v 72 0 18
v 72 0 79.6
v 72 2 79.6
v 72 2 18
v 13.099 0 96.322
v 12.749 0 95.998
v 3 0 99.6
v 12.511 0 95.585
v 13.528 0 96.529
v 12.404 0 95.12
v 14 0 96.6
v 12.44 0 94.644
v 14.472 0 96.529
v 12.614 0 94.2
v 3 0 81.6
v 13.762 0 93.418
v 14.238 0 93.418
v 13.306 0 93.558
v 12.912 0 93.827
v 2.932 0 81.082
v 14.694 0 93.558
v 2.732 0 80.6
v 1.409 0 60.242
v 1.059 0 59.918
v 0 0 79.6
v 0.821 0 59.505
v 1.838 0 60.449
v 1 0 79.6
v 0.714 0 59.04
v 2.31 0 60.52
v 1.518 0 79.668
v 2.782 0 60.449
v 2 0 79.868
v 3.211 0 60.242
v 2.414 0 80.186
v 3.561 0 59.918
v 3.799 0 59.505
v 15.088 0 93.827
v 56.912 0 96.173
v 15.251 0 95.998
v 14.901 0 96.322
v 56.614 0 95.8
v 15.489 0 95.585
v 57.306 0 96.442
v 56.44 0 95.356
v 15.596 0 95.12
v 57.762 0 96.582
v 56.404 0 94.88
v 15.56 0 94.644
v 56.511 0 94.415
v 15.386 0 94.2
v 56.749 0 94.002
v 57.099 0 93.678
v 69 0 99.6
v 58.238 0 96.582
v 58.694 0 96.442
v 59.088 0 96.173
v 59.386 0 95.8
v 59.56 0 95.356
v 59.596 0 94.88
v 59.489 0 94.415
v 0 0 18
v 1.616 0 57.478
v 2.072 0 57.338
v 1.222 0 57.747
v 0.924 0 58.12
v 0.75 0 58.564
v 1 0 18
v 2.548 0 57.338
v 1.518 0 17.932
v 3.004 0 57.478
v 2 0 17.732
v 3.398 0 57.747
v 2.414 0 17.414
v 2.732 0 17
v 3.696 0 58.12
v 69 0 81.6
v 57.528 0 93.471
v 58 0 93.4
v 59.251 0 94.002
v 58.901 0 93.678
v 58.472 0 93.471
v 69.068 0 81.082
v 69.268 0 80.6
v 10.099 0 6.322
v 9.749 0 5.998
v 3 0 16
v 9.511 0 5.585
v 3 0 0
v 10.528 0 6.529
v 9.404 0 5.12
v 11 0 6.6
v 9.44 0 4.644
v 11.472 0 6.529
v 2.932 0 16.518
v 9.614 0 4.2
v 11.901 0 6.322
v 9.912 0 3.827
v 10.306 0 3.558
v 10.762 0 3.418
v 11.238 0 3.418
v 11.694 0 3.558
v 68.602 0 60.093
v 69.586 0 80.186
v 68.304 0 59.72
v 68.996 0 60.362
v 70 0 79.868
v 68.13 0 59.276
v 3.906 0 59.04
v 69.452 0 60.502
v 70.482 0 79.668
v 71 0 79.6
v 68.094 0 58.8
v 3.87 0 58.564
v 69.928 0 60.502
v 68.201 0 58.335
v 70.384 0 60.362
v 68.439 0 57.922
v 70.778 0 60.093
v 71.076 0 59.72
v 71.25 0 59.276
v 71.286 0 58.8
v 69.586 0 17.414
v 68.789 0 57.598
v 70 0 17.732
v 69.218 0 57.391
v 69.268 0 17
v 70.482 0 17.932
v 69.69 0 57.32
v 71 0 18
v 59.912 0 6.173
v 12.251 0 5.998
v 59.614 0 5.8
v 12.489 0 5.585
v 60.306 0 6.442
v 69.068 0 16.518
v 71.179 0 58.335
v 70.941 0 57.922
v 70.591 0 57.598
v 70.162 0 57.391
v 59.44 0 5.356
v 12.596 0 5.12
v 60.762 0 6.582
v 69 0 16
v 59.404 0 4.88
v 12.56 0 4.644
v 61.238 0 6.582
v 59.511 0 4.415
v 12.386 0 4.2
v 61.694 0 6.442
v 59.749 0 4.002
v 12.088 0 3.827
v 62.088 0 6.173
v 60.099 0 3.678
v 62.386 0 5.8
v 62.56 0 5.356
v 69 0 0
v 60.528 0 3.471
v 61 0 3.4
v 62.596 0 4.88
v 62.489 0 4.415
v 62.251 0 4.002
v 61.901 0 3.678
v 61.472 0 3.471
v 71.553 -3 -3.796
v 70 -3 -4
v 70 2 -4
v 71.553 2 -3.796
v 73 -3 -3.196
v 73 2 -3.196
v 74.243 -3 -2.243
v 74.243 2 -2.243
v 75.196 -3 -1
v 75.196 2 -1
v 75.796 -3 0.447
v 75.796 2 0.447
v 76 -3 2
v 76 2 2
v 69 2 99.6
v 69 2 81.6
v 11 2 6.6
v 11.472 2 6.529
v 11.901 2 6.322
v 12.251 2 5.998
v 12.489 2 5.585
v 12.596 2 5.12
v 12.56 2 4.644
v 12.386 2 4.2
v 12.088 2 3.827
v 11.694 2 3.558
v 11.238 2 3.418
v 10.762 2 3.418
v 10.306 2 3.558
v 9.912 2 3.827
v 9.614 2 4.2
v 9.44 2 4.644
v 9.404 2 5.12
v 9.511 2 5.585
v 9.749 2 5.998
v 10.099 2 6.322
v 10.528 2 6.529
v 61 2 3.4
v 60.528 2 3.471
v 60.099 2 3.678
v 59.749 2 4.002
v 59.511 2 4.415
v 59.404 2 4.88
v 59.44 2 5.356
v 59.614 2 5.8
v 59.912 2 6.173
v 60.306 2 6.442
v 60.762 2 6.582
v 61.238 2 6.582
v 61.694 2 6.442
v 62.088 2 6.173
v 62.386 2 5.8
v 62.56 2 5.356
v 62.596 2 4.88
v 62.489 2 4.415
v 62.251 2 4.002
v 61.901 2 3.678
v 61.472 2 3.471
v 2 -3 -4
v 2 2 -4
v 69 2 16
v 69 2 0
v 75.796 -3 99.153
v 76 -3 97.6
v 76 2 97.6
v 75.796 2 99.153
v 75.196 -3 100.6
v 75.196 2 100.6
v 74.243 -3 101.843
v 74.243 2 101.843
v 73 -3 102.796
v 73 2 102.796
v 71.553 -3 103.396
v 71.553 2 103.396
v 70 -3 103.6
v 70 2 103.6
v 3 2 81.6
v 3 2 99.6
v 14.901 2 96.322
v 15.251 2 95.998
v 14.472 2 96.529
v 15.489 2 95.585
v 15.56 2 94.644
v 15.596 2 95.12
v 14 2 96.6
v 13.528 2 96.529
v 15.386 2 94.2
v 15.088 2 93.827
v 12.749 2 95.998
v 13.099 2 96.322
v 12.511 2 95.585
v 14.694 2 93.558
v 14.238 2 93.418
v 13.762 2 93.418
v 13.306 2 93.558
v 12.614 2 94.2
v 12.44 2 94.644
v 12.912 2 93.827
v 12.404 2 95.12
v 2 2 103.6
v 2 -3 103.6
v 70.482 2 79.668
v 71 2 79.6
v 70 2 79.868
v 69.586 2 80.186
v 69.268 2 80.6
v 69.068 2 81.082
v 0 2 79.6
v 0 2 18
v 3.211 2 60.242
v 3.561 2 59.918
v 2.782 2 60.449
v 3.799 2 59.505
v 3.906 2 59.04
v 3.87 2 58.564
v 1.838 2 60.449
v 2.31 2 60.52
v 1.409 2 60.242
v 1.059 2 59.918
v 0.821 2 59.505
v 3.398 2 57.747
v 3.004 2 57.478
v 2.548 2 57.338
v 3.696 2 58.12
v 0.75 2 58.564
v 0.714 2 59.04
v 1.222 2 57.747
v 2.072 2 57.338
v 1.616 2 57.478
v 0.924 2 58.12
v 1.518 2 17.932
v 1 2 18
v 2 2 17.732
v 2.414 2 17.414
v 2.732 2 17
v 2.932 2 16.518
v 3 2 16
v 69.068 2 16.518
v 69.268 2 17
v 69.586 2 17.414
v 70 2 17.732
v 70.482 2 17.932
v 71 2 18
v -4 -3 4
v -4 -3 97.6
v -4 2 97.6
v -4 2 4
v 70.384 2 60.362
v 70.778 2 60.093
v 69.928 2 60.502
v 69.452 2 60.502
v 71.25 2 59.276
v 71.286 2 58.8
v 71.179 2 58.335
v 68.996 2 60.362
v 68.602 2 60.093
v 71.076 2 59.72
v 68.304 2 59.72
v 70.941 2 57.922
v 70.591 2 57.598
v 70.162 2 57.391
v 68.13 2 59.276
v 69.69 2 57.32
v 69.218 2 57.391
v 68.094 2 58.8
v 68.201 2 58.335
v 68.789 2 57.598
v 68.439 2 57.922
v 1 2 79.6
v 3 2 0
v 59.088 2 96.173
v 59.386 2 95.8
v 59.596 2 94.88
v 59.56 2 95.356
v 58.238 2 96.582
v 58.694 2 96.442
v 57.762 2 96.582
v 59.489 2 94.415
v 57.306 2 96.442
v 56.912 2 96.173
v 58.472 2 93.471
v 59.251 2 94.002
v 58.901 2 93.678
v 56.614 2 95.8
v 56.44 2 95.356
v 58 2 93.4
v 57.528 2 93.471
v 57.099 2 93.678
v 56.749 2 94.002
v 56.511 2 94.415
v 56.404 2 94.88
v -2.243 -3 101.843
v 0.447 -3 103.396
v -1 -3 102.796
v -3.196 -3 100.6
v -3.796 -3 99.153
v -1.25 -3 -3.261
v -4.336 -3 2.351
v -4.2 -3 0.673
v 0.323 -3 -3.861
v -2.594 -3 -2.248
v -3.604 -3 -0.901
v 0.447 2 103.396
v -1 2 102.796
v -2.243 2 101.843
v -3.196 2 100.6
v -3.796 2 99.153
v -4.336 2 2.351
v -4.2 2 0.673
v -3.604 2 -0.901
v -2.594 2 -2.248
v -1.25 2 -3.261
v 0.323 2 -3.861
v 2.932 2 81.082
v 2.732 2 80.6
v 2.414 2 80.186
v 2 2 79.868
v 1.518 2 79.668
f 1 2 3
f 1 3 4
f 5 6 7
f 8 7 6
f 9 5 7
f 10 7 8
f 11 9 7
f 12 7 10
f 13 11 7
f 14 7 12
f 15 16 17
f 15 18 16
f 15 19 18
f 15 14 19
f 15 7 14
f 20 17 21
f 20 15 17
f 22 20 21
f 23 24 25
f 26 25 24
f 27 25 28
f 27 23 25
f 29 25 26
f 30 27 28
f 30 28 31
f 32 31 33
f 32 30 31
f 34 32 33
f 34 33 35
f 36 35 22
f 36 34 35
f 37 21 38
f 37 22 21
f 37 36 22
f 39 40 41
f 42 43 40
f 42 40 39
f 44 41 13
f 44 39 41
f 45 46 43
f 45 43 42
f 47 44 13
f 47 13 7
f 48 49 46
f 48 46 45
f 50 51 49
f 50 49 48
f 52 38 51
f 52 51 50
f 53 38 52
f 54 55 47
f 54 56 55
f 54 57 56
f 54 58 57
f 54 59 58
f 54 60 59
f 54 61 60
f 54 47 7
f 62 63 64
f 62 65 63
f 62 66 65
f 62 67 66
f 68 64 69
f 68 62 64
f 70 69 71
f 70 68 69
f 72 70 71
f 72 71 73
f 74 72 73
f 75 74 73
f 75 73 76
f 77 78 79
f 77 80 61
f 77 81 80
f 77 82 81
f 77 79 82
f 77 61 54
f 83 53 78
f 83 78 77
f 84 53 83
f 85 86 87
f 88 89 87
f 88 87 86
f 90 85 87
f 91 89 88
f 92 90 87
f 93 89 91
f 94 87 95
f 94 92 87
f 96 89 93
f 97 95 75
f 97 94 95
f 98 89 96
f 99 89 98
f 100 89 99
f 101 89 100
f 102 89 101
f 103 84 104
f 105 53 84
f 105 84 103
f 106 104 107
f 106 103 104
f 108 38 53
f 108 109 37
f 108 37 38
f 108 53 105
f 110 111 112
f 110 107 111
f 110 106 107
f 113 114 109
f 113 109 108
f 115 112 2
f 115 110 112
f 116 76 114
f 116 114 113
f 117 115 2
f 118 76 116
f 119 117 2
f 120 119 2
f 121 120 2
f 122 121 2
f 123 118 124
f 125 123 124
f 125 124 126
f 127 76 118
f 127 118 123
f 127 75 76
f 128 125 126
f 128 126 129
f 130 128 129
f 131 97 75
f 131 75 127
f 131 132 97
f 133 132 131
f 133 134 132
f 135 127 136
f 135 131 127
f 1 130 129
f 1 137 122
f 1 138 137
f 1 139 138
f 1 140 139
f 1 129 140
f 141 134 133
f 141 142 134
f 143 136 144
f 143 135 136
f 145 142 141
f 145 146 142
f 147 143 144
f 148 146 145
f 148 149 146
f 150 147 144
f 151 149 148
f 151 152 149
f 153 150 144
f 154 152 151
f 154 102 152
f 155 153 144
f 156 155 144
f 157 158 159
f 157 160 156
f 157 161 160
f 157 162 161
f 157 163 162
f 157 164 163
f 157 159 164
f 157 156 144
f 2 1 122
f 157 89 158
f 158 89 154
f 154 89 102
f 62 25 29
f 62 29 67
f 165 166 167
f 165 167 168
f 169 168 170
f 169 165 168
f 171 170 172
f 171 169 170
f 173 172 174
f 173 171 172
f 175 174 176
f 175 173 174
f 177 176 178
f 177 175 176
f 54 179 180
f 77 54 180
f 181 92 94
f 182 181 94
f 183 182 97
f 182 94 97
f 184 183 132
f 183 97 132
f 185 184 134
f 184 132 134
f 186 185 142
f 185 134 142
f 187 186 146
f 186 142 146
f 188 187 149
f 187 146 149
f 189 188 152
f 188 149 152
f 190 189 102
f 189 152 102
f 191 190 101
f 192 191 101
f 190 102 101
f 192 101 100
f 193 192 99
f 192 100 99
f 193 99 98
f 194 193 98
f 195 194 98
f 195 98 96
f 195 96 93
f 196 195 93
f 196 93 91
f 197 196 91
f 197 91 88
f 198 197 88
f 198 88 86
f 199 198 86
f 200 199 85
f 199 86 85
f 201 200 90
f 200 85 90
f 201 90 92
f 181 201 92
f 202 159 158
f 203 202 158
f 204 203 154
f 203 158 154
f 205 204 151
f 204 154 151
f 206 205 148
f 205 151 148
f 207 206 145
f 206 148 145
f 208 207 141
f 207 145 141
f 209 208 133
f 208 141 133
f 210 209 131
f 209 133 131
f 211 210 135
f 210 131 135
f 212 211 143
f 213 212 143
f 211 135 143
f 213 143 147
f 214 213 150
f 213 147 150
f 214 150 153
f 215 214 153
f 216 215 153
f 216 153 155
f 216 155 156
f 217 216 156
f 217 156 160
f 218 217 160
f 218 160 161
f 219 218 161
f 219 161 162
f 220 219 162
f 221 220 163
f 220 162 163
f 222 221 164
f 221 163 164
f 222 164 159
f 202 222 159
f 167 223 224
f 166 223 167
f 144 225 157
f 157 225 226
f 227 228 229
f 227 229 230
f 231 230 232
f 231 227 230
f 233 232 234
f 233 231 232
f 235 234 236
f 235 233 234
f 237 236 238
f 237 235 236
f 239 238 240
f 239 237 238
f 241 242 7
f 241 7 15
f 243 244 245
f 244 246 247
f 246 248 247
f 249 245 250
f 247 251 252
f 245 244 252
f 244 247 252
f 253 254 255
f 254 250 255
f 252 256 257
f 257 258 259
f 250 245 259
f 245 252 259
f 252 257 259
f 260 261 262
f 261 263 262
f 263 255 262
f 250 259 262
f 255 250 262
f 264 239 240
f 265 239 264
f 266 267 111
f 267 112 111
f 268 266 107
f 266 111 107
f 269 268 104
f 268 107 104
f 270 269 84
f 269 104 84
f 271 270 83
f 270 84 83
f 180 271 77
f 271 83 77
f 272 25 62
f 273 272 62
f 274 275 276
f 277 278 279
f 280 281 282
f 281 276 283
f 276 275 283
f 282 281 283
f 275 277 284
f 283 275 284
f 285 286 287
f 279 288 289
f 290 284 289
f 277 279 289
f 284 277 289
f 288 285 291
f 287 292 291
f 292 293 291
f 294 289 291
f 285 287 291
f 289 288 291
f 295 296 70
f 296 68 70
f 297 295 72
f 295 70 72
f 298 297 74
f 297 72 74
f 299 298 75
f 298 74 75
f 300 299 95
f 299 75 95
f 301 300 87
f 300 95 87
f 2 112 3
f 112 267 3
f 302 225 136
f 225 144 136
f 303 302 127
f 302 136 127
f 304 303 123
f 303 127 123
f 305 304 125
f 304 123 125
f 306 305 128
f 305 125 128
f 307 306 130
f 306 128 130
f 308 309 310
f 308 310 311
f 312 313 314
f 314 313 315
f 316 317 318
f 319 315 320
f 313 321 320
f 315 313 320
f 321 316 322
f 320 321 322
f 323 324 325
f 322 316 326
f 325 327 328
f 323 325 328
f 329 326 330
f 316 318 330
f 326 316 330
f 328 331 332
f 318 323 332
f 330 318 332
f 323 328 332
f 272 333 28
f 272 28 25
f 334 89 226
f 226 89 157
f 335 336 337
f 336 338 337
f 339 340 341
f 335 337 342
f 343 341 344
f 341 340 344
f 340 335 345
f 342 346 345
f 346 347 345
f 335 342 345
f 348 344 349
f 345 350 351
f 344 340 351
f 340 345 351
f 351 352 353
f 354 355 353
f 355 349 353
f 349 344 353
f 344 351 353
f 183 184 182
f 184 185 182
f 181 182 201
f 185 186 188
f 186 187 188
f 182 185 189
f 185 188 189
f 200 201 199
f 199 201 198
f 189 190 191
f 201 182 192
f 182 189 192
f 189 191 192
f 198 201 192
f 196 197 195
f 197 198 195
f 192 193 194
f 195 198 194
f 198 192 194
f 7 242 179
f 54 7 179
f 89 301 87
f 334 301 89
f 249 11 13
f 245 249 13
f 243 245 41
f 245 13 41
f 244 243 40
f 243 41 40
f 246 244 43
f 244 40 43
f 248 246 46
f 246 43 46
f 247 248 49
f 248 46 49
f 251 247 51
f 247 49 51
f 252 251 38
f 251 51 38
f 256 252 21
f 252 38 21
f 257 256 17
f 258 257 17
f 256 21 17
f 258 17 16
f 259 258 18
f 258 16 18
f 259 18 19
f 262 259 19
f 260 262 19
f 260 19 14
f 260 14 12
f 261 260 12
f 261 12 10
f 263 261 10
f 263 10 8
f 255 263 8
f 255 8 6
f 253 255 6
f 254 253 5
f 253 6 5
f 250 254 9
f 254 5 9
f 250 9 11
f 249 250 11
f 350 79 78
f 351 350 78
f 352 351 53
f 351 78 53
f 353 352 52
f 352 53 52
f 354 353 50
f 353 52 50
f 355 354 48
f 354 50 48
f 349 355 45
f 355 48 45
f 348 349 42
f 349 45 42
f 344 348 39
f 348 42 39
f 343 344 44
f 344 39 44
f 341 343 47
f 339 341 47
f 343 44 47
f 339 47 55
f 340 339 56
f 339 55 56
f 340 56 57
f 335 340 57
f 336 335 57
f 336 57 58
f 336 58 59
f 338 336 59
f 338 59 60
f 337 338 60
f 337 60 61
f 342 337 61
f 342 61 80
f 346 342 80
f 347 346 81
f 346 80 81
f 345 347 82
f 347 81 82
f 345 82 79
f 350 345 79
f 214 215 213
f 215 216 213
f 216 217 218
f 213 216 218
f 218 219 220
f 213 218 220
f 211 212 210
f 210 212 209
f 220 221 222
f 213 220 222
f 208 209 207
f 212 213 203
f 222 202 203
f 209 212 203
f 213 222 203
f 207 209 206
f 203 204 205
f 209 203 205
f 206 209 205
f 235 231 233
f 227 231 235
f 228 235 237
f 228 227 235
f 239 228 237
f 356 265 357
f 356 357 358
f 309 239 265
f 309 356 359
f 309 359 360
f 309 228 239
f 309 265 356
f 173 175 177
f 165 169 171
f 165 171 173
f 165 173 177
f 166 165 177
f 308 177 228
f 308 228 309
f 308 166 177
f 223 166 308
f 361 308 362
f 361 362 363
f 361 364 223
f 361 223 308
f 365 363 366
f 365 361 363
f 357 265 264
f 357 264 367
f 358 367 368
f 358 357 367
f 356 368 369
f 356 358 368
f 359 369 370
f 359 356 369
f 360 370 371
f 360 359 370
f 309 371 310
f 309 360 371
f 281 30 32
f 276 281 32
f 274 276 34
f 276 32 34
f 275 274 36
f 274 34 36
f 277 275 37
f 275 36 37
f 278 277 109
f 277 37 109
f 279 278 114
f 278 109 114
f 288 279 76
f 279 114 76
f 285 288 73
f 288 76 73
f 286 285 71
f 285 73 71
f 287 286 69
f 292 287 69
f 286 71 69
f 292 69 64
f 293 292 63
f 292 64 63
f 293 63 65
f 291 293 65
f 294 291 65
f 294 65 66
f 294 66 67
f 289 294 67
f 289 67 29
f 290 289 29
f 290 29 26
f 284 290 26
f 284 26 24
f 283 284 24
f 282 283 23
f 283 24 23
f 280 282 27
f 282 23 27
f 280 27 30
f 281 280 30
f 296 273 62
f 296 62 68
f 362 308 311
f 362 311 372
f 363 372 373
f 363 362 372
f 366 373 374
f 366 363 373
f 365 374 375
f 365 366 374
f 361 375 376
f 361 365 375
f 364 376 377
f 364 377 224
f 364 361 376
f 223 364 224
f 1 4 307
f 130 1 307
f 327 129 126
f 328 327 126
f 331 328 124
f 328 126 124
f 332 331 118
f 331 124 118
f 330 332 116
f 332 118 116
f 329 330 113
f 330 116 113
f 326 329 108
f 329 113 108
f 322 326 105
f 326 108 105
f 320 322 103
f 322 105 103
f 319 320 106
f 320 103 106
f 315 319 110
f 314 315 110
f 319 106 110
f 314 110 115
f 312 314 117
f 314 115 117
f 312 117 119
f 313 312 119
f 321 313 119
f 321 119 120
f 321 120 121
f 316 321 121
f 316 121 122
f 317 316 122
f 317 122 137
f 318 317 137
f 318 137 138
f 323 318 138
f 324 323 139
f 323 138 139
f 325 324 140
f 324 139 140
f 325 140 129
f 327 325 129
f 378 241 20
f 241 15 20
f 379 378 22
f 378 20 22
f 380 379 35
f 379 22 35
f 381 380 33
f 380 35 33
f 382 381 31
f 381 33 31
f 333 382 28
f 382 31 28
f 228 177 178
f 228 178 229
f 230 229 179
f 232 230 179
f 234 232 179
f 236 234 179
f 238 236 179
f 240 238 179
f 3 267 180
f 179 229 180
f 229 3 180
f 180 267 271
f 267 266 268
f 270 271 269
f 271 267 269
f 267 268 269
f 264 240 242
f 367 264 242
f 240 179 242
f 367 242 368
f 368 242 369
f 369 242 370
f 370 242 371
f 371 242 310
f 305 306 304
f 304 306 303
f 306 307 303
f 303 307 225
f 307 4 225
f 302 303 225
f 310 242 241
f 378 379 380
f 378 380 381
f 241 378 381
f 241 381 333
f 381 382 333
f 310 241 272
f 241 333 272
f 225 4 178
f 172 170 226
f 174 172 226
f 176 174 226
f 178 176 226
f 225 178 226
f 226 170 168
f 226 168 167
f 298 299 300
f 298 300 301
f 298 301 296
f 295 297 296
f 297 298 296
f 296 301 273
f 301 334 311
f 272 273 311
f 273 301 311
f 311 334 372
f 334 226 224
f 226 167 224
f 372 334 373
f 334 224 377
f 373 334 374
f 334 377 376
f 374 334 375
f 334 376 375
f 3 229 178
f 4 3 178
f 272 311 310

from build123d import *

# Parameters (mm, degrees)
SKETCH_1_W          = 72
SKETCH_1_H          = 99.6
SKETCH_1_R          = 1.6
EXTRUDE_1_DEPTH     = 2
FILLET_1_R          = 3
SKETCH_7_W          = 2.173613934
SKETCH_7_H          = 4.368539476
CUT_EXTRUDE_1_DEPTH = 10
CUT_EXTRUDE_2_DEPTH = 10
FILLET_2_R          = 2
SKETCH_9_W          = 2.173613934
SKETCH_9_H          = 2.184269738
EXTRUDE_5_DEPTH     = 2
FILLET_4_R          = 2
FILLET_5_R          = 2
EXTRUDE_4_DEPTH     = 5


with BuildPart() as part:
    # 草图1 → 凸台-拉伸1 (new body)
    with BuildSketch(Plane(origin=(0, 0, 0), x_dir=(1, 0, 0), z_dir=(0, 1, 0))):
        with Locations((36, -49.8)):
            Rectangle(SKETCH_1_W, SKETCH_1_H)
        with Locations((11, -5)):
            Circle(SKETCH_1_R, mode=Mode.SUBTRACT)
        with Locations((14, -95)):
            Circle(SKETCH_1_R, mode=Mode.SUBTRACT)
        with Locations((58, -95)):
            Circle(SKETCH_1_R, mode=Mode.SUBTRACT)
        with Locations((61, -5)):
            Circle(SKETCH_1_R, mode=Mode.SUBTRACT)
        with Locations((2.31, -58.92)):
            Circle(SKETCH_1_R, mode=Mode.SUBTRACT)
        with Locations((69.69, -58.92)):
            Circle(SKETCH_1_R, mode=Mode.SUBTRACT)
    extrude(amount=EXTRUDE_1_DEPTH)

    # 圆角1
    fillet_1_edges = [part.edges().sort_by_distance(p)[0] for p in [
        (0, 1, 0),
        (72, 1, 0),
        (72, 1, 99.6),
        (0, 1, 99.6),
    ]]
    fillet(fillet_1_edges, radius=FILLET_1_R)

    # 草图7 → 切除-拉伸1 (cut)
    with BuildSketch(Plane(origin=(0, 2, 0), x_dir=(1, 0, 0), z_dir=(0, 1, 0))):
        with Locations((36, -99.6)):
            Rectangle(SKETCH_7_W, SKETCH_7_H)
    extrude(amount=-CUT_EXTRUDE_1_DEPTH, mode=Mode.SUBTRACT)

    # 草图8 → 切除-拉伸2 (cut)
    with BuildSketch(Plane(origin=(0, 2, 0), x_dir=(1, 0, 0), z_dir=(0, 1, 0))):
        with BuildLine():
            Line((3, -99.6), (3, -79.6))
            Line((3, -79.6), (0, -79.6))
            Line((0, -79.6), (0, -96.6))
            ThreePointArc((0, -96.6), (0.878679656, -98.721320344), (3, -99.6))
        make_face()
        with BuildLine():
            Line((0, -3), (0, -18))
            Line((0, -18), (3, -18))
            Line((3, -18), (3, 0))
            ThreePointArc((3, 0), (0.878679656, -0.878679656), (0, -3))
        make_face()
        with BuildLine():
            Line((69, -79.6), (69, -99.6))
            ThreePointArc((69, -99.6), (71.121320344, -98.721320344), (72, -96.6))
            Line((72, -96.6), (72, -79.6))
            Line((72, -79.6), (69, -79.6))
        make_face()
    cut_extrude_2 = extrude(amount=-CUT_EXTRUDE_2_DEPTH, mode=Mode.SUBTRACT)

    # 圆角2
    fillet_2_edges = [part.edges().sort_by_distance(p)[0] for p in [
        (3, 1, 79.6),
        (69, 1, 79.6),
    ]]
    fillet(fillet_2_edges, radius=FILLET_2_R)

    # 镜向2: 切除-拉伸2 across plane
    add(cut_extrude_2.mirror(Plane(origin=(36, 0, 0), x_dir=(0, 0, 1), z_dir=(1, 0, 0))), mode=Mode.SUBTRACT)

    # 草图9 → 凸台-拉伸5 (add)
    with BuildSketch(Plane(origin=(0, 2, 0), x_dir=(1, 0, 0), z_dir=(0, 1, 0))):
        with Locations((36, -98.507865131)):
            Rectangle(SKETCH_9_W, SKETCH_9_H)
    extrude(amount=-EXTRUDE_5_DEPTH)

    # 圆角4
    fillet_4_edges = [part.edges().sort_by_distance(p)[0] for p in [
        (69, 1, 18),
        (3, 1, 18),
    ]]
    fillet(fillet_4_edges, radius=FILLET_4_R)

    # 圆角5
    fillet_5_edges = [part.edges().sort_by_distance(p)[0] for p in [
        (3, 1, 79.6),
        (69, 1, 79.6),
    ]]
    fillet(fillet_5_edges, radius=FILLET_5_R)


with BuildPart() as body_2:
    # 草图6 → 凸台-拉伸4 (new body)
    with BuildSketch(Plane(origin=(0, -3, 0), x_dir=(-1, 0, 0), z_dir=(0, -1, 0))):
        with BuildLine():
            Line((-2, 4), (-70, 4))
            ThreePointArc((-70, 4), (-74.242640687, 2.242640687), (-76, -2))
            Line((-76, -2), (-76, -18))
            Line((-76, -18), (-76, -97.6))
            ThreePointArc((-76, -97.6), (-74.242640687, -101.842640687), (-70, -103.6))
            Line((-70, -103.6), (-2, -103.6))
            ThreePointArc((-2, -103.6), (2.242640687, -101.842640687), (4, -97.6))
            Line((4, -97.6), (4, -4))
            ThreePointArc((4, -4), (3.146700168, 1.610025126), (-2, 4))
        make_face()
    extrude(amount=-EXTRUDE_4_DEPTH)

    # Combine 1: cut part
    add(part.part, mode=Mode.SUBTRACT)


solid = body_2.part
